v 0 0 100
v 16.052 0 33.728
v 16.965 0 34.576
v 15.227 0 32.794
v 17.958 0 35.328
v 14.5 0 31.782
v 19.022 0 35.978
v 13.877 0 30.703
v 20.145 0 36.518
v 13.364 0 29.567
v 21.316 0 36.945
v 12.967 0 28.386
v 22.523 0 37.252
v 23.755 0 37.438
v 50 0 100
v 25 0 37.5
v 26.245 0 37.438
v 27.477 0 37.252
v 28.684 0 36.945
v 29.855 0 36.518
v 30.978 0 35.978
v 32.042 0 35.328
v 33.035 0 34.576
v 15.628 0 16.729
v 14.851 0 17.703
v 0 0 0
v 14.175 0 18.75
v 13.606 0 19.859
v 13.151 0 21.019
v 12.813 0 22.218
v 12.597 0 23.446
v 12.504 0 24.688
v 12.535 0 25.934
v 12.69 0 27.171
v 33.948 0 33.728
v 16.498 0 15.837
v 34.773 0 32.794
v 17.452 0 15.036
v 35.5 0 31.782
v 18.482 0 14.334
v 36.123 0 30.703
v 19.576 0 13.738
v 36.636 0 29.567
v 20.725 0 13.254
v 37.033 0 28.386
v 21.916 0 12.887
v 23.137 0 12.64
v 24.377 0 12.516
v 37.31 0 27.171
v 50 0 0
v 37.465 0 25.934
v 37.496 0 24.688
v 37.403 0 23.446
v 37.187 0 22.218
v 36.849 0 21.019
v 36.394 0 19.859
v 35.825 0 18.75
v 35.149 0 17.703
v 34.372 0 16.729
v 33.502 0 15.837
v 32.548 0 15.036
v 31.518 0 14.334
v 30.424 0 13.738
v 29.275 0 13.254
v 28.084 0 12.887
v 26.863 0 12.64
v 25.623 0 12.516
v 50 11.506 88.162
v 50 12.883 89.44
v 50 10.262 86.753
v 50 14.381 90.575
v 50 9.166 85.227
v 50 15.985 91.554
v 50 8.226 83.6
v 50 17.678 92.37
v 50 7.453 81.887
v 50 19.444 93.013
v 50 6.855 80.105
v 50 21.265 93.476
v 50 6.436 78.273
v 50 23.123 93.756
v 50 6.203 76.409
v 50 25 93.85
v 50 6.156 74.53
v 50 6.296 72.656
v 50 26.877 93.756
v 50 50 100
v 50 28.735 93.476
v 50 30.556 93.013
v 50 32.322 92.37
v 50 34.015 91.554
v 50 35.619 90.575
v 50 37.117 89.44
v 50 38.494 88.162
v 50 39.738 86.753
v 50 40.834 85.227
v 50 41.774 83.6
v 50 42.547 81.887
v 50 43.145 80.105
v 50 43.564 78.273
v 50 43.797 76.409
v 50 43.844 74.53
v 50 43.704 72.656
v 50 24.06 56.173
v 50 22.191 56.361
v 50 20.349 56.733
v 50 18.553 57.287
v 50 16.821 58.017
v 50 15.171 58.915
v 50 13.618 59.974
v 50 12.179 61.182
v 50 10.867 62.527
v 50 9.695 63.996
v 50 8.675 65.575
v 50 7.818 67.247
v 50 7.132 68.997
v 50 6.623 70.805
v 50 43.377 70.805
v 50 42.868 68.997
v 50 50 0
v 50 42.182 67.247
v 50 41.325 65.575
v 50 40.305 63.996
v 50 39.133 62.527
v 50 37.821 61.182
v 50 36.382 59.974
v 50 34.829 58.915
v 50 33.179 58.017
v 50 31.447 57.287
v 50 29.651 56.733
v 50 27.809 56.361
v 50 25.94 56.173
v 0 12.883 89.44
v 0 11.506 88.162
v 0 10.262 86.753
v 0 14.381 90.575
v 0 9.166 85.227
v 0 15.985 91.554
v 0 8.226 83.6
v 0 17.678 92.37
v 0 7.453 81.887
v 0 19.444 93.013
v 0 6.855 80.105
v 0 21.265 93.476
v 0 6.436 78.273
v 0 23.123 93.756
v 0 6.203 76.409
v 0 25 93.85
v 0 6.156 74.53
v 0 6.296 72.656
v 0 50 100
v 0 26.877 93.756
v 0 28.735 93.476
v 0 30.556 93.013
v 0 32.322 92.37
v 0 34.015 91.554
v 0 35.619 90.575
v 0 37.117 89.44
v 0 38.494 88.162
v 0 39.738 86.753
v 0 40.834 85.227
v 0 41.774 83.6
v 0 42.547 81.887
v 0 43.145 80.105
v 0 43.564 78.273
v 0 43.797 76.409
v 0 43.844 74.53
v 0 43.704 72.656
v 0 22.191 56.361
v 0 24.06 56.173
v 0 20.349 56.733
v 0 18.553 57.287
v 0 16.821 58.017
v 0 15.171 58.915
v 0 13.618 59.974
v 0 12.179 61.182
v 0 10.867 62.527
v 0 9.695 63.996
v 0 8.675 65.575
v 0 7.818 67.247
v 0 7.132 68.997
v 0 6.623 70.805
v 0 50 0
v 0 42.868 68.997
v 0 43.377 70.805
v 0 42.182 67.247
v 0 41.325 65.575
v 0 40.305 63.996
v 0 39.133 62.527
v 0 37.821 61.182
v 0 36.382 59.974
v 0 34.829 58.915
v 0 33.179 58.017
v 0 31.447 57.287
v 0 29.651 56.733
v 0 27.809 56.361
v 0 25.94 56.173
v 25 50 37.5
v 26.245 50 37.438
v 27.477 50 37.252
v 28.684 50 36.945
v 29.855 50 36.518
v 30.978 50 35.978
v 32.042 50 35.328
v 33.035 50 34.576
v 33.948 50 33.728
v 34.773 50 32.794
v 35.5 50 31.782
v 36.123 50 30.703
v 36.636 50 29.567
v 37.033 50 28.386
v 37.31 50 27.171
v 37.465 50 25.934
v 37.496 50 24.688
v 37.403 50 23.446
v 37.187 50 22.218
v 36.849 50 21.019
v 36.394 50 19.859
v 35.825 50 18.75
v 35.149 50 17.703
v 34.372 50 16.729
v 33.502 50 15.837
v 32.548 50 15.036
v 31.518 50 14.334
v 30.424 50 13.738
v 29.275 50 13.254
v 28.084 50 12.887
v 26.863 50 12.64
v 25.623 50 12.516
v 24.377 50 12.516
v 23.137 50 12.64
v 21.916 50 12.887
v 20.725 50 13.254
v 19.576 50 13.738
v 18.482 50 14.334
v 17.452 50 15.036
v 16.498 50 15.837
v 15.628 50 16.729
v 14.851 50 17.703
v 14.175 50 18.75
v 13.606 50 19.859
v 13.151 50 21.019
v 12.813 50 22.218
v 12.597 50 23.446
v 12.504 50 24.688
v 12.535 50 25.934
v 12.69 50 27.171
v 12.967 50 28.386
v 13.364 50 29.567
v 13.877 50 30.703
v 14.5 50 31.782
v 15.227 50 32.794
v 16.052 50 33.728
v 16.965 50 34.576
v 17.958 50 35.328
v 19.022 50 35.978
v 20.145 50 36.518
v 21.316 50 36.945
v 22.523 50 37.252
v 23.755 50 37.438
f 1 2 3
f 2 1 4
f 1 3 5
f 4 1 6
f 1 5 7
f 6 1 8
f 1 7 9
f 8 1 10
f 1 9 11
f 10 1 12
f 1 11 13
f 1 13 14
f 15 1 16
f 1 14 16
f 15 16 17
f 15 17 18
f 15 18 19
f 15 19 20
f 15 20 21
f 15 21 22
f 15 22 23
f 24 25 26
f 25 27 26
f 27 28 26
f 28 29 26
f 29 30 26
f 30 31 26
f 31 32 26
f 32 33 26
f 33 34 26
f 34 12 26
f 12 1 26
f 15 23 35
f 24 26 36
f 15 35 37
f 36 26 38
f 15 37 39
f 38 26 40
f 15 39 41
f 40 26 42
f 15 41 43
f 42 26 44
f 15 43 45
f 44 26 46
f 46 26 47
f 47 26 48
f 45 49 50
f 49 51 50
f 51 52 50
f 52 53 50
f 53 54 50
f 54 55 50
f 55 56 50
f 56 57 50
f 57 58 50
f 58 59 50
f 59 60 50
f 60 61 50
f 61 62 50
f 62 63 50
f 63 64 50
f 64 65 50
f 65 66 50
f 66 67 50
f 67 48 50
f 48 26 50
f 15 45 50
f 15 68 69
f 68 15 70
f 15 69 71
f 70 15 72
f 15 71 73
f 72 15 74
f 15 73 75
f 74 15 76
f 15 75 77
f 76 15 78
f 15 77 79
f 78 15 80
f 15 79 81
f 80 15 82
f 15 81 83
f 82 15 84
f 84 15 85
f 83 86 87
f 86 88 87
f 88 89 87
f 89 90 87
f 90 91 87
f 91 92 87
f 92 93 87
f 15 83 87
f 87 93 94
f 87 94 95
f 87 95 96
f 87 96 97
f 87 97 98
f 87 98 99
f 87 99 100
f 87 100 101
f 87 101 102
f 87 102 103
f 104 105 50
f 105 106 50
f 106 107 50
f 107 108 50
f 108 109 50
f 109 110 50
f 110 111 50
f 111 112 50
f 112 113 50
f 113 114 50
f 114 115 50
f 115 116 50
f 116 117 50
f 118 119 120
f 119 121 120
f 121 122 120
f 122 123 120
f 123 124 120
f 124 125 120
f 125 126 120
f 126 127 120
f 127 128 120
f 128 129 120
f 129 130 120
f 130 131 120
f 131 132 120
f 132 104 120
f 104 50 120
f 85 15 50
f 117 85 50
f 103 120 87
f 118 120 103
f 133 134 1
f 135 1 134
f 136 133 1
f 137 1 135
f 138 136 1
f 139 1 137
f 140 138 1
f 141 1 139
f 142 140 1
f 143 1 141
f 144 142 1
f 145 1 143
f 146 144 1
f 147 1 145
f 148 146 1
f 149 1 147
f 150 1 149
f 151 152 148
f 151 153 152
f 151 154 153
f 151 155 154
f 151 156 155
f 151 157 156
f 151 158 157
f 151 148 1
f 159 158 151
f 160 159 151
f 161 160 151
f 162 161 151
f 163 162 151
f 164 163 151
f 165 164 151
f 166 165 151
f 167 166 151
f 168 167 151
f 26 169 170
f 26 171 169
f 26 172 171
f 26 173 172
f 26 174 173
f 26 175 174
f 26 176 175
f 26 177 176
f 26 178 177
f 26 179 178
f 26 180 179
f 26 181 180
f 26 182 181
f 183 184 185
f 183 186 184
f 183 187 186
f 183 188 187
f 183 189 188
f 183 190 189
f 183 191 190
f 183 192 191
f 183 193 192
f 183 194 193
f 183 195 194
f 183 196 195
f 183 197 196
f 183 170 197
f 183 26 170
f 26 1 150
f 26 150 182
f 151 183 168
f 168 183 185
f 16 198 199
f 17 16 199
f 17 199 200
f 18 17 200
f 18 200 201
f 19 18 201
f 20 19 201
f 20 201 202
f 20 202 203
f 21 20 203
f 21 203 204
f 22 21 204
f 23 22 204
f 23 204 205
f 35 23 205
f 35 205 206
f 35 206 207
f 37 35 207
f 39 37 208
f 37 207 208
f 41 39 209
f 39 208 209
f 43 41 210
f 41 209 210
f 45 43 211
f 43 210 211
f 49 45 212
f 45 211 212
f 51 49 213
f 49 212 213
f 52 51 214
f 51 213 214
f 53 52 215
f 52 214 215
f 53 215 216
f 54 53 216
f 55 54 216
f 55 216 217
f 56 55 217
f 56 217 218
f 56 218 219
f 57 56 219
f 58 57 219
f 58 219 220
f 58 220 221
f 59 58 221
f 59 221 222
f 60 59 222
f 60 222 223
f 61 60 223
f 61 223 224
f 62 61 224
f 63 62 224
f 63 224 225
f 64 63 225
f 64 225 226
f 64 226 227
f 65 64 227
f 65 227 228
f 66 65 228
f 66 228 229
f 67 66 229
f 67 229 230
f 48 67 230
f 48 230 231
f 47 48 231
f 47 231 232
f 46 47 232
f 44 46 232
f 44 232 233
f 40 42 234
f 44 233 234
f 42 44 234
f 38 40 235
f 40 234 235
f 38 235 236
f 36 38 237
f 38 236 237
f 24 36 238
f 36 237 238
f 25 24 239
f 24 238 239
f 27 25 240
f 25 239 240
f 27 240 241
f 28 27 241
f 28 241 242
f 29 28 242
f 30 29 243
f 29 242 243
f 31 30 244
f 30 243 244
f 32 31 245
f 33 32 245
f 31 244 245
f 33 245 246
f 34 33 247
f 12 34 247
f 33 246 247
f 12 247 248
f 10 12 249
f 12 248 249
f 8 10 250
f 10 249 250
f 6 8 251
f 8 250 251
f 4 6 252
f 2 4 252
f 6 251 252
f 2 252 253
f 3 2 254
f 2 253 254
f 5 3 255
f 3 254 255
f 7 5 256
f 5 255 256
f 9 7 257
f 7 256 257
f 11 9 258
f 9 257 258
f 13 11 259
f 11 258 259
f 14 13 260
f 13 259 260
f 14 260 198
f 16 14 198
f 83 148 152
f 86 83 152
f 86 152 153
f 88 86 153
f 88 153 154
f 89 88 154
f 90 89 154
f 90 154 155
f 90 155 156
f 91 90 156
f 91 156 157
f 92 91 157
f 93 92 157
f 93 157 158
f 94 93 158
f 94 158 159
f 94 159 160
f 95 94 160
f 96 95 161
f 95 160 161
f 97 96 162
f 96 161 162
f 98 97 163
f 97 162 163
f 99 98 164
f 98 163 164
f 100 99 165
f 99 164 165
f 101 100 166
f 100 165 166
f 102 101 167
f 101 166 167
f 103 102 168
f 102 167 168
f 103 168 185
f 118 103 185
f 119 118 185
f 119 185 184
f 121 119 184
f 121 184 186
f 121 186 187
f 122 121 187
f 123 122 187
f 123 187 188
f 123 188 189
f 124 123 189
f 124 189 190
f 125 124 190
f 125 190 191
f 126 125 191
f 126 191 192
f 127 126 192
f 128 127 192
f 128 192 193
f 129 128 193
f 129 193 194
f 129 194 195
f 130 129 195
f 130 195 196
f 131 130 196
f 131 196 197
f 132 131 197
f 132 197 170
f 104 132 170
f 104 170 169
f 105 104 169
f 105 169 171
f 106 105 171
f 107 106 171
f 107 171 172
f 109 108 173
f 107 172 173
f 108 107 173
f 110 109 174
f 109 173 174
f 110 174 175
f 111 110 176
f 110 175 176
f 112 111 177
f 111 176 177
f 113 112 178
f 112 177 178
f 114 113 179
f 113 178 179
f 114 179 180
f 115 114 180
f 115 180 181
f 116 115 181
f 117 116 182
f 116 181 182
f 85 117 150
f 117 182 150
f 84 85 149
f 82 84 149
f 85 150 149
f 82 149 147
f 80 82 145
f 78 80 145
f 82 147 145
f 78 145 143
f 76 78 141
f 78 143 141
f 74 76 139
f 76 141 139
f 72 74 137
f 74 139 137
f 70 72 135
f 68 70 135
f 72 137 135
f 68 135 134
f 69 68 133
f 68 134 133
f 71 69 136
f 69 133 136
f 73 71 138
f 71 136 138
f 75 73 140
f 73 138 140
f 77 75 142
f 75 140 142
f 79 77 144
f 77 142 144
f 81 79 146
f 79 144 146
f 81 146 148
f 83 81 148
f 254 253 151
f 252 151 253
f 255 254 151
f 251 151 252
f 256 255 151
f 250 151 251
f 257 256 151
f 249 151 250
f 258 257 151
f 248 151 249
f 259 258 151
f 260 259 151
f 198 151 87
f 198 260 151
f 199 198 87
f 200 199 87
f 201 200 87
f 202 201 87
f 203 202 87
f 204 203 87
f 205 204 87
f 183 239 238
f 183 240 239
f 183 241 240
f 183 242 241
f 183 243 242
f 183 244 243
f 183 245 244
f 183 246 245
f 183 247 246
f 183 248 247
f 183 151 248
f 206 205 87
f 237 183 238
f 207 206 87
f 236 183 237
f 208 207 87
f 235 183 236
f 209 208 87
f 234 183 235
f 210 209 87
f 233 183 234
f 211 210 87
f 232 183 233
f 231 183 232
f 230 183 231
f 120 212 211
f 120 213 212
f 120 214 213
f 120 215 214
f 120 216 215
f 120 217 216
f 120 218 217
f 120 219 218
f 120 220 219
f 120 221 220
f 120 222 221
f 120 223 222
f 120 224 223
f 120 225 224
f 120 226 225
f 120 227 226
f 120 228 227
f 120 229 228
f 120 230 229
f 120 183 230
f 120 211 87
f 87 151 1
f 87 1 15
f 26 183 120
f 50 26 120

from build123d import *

# Parameters (mm, degrees)
SZKIC1_W                    = 50
SZKIC1_H                    = 50
DODANIE_WYCI_GNI_CIE1_DEPTH = 100
WYTNIJ_WYCI_GNI_CIE1_REACH  = 124.474
SZKIC2_R                    = 12.5
WYTNIJ_WYCI_GNI_CIE2_REACH  = 124.474
SZKIC3_R                    = 18.85


with BuildPart() as part:
    # Szkic1 → Dodanie-wyciągnięcie1 (new body)
    with BuildSketch(Plane.XY):
        with Locations((25, 25)):
            Rectangle(SZKIC1_W, SZKIC1_H)
    extrude(amount=DODANIE_WYCI_GNI_CIE1_DEPTH)

    # Szkic2 → Wytnij-wyciągnięcie1 (cut, up to next)
    with BuildSketch(Plane(origin=(0, 50, 0), x_dir=(1, 0, 0), z_dir=(0, 1, 0)), mode=Mode.PRIVATE) as wytnij_wyci_gni_cie1_sk1:
        with Locations(Location((25, -25, 0), (0, 0, 270))):
            Circle(SZKIC2_R)
    wytnij_wyci_gni_cie1_tool1 = extrude(wytnij_wyci_gni_cie1_sk1.sketch, amount=-WYTNIJ_WYCI_GNI_CIE1_REACH, mode=Mode.PRIVATE) & part.part
    add(wytnij_wyci_gni_cie1_tool1.solids().sort_by_distance((25, 50, 25))[0], mode=Mode.SUBTRACT)

    # Szkic3 → Wytnij-wyciągnięcie2 (cut, up to next)
    with BuildSketch(Plane.ZY, mode=Mode.PRIVATE) as wytnij_wyci_gni_cie2_sk1:
        with Locations((75, 25)):
            Circle(SZKIC3_R)
    wytnij_wyci_gni_cie2_tool1 = extrude(wytnij_wyci_gni_cie2_sk1.sketch, amount=-WYTNIJ_WYCI_GNI_CIE2_REACH, mode=Mode.PRIVATE) & part.part
    add(wytnij_wyci_gni_cie2_tool1.solids().sort_by_distance((0, 25, 75))[0], mode=Mode.SUBTRACT)


solid = part.part
